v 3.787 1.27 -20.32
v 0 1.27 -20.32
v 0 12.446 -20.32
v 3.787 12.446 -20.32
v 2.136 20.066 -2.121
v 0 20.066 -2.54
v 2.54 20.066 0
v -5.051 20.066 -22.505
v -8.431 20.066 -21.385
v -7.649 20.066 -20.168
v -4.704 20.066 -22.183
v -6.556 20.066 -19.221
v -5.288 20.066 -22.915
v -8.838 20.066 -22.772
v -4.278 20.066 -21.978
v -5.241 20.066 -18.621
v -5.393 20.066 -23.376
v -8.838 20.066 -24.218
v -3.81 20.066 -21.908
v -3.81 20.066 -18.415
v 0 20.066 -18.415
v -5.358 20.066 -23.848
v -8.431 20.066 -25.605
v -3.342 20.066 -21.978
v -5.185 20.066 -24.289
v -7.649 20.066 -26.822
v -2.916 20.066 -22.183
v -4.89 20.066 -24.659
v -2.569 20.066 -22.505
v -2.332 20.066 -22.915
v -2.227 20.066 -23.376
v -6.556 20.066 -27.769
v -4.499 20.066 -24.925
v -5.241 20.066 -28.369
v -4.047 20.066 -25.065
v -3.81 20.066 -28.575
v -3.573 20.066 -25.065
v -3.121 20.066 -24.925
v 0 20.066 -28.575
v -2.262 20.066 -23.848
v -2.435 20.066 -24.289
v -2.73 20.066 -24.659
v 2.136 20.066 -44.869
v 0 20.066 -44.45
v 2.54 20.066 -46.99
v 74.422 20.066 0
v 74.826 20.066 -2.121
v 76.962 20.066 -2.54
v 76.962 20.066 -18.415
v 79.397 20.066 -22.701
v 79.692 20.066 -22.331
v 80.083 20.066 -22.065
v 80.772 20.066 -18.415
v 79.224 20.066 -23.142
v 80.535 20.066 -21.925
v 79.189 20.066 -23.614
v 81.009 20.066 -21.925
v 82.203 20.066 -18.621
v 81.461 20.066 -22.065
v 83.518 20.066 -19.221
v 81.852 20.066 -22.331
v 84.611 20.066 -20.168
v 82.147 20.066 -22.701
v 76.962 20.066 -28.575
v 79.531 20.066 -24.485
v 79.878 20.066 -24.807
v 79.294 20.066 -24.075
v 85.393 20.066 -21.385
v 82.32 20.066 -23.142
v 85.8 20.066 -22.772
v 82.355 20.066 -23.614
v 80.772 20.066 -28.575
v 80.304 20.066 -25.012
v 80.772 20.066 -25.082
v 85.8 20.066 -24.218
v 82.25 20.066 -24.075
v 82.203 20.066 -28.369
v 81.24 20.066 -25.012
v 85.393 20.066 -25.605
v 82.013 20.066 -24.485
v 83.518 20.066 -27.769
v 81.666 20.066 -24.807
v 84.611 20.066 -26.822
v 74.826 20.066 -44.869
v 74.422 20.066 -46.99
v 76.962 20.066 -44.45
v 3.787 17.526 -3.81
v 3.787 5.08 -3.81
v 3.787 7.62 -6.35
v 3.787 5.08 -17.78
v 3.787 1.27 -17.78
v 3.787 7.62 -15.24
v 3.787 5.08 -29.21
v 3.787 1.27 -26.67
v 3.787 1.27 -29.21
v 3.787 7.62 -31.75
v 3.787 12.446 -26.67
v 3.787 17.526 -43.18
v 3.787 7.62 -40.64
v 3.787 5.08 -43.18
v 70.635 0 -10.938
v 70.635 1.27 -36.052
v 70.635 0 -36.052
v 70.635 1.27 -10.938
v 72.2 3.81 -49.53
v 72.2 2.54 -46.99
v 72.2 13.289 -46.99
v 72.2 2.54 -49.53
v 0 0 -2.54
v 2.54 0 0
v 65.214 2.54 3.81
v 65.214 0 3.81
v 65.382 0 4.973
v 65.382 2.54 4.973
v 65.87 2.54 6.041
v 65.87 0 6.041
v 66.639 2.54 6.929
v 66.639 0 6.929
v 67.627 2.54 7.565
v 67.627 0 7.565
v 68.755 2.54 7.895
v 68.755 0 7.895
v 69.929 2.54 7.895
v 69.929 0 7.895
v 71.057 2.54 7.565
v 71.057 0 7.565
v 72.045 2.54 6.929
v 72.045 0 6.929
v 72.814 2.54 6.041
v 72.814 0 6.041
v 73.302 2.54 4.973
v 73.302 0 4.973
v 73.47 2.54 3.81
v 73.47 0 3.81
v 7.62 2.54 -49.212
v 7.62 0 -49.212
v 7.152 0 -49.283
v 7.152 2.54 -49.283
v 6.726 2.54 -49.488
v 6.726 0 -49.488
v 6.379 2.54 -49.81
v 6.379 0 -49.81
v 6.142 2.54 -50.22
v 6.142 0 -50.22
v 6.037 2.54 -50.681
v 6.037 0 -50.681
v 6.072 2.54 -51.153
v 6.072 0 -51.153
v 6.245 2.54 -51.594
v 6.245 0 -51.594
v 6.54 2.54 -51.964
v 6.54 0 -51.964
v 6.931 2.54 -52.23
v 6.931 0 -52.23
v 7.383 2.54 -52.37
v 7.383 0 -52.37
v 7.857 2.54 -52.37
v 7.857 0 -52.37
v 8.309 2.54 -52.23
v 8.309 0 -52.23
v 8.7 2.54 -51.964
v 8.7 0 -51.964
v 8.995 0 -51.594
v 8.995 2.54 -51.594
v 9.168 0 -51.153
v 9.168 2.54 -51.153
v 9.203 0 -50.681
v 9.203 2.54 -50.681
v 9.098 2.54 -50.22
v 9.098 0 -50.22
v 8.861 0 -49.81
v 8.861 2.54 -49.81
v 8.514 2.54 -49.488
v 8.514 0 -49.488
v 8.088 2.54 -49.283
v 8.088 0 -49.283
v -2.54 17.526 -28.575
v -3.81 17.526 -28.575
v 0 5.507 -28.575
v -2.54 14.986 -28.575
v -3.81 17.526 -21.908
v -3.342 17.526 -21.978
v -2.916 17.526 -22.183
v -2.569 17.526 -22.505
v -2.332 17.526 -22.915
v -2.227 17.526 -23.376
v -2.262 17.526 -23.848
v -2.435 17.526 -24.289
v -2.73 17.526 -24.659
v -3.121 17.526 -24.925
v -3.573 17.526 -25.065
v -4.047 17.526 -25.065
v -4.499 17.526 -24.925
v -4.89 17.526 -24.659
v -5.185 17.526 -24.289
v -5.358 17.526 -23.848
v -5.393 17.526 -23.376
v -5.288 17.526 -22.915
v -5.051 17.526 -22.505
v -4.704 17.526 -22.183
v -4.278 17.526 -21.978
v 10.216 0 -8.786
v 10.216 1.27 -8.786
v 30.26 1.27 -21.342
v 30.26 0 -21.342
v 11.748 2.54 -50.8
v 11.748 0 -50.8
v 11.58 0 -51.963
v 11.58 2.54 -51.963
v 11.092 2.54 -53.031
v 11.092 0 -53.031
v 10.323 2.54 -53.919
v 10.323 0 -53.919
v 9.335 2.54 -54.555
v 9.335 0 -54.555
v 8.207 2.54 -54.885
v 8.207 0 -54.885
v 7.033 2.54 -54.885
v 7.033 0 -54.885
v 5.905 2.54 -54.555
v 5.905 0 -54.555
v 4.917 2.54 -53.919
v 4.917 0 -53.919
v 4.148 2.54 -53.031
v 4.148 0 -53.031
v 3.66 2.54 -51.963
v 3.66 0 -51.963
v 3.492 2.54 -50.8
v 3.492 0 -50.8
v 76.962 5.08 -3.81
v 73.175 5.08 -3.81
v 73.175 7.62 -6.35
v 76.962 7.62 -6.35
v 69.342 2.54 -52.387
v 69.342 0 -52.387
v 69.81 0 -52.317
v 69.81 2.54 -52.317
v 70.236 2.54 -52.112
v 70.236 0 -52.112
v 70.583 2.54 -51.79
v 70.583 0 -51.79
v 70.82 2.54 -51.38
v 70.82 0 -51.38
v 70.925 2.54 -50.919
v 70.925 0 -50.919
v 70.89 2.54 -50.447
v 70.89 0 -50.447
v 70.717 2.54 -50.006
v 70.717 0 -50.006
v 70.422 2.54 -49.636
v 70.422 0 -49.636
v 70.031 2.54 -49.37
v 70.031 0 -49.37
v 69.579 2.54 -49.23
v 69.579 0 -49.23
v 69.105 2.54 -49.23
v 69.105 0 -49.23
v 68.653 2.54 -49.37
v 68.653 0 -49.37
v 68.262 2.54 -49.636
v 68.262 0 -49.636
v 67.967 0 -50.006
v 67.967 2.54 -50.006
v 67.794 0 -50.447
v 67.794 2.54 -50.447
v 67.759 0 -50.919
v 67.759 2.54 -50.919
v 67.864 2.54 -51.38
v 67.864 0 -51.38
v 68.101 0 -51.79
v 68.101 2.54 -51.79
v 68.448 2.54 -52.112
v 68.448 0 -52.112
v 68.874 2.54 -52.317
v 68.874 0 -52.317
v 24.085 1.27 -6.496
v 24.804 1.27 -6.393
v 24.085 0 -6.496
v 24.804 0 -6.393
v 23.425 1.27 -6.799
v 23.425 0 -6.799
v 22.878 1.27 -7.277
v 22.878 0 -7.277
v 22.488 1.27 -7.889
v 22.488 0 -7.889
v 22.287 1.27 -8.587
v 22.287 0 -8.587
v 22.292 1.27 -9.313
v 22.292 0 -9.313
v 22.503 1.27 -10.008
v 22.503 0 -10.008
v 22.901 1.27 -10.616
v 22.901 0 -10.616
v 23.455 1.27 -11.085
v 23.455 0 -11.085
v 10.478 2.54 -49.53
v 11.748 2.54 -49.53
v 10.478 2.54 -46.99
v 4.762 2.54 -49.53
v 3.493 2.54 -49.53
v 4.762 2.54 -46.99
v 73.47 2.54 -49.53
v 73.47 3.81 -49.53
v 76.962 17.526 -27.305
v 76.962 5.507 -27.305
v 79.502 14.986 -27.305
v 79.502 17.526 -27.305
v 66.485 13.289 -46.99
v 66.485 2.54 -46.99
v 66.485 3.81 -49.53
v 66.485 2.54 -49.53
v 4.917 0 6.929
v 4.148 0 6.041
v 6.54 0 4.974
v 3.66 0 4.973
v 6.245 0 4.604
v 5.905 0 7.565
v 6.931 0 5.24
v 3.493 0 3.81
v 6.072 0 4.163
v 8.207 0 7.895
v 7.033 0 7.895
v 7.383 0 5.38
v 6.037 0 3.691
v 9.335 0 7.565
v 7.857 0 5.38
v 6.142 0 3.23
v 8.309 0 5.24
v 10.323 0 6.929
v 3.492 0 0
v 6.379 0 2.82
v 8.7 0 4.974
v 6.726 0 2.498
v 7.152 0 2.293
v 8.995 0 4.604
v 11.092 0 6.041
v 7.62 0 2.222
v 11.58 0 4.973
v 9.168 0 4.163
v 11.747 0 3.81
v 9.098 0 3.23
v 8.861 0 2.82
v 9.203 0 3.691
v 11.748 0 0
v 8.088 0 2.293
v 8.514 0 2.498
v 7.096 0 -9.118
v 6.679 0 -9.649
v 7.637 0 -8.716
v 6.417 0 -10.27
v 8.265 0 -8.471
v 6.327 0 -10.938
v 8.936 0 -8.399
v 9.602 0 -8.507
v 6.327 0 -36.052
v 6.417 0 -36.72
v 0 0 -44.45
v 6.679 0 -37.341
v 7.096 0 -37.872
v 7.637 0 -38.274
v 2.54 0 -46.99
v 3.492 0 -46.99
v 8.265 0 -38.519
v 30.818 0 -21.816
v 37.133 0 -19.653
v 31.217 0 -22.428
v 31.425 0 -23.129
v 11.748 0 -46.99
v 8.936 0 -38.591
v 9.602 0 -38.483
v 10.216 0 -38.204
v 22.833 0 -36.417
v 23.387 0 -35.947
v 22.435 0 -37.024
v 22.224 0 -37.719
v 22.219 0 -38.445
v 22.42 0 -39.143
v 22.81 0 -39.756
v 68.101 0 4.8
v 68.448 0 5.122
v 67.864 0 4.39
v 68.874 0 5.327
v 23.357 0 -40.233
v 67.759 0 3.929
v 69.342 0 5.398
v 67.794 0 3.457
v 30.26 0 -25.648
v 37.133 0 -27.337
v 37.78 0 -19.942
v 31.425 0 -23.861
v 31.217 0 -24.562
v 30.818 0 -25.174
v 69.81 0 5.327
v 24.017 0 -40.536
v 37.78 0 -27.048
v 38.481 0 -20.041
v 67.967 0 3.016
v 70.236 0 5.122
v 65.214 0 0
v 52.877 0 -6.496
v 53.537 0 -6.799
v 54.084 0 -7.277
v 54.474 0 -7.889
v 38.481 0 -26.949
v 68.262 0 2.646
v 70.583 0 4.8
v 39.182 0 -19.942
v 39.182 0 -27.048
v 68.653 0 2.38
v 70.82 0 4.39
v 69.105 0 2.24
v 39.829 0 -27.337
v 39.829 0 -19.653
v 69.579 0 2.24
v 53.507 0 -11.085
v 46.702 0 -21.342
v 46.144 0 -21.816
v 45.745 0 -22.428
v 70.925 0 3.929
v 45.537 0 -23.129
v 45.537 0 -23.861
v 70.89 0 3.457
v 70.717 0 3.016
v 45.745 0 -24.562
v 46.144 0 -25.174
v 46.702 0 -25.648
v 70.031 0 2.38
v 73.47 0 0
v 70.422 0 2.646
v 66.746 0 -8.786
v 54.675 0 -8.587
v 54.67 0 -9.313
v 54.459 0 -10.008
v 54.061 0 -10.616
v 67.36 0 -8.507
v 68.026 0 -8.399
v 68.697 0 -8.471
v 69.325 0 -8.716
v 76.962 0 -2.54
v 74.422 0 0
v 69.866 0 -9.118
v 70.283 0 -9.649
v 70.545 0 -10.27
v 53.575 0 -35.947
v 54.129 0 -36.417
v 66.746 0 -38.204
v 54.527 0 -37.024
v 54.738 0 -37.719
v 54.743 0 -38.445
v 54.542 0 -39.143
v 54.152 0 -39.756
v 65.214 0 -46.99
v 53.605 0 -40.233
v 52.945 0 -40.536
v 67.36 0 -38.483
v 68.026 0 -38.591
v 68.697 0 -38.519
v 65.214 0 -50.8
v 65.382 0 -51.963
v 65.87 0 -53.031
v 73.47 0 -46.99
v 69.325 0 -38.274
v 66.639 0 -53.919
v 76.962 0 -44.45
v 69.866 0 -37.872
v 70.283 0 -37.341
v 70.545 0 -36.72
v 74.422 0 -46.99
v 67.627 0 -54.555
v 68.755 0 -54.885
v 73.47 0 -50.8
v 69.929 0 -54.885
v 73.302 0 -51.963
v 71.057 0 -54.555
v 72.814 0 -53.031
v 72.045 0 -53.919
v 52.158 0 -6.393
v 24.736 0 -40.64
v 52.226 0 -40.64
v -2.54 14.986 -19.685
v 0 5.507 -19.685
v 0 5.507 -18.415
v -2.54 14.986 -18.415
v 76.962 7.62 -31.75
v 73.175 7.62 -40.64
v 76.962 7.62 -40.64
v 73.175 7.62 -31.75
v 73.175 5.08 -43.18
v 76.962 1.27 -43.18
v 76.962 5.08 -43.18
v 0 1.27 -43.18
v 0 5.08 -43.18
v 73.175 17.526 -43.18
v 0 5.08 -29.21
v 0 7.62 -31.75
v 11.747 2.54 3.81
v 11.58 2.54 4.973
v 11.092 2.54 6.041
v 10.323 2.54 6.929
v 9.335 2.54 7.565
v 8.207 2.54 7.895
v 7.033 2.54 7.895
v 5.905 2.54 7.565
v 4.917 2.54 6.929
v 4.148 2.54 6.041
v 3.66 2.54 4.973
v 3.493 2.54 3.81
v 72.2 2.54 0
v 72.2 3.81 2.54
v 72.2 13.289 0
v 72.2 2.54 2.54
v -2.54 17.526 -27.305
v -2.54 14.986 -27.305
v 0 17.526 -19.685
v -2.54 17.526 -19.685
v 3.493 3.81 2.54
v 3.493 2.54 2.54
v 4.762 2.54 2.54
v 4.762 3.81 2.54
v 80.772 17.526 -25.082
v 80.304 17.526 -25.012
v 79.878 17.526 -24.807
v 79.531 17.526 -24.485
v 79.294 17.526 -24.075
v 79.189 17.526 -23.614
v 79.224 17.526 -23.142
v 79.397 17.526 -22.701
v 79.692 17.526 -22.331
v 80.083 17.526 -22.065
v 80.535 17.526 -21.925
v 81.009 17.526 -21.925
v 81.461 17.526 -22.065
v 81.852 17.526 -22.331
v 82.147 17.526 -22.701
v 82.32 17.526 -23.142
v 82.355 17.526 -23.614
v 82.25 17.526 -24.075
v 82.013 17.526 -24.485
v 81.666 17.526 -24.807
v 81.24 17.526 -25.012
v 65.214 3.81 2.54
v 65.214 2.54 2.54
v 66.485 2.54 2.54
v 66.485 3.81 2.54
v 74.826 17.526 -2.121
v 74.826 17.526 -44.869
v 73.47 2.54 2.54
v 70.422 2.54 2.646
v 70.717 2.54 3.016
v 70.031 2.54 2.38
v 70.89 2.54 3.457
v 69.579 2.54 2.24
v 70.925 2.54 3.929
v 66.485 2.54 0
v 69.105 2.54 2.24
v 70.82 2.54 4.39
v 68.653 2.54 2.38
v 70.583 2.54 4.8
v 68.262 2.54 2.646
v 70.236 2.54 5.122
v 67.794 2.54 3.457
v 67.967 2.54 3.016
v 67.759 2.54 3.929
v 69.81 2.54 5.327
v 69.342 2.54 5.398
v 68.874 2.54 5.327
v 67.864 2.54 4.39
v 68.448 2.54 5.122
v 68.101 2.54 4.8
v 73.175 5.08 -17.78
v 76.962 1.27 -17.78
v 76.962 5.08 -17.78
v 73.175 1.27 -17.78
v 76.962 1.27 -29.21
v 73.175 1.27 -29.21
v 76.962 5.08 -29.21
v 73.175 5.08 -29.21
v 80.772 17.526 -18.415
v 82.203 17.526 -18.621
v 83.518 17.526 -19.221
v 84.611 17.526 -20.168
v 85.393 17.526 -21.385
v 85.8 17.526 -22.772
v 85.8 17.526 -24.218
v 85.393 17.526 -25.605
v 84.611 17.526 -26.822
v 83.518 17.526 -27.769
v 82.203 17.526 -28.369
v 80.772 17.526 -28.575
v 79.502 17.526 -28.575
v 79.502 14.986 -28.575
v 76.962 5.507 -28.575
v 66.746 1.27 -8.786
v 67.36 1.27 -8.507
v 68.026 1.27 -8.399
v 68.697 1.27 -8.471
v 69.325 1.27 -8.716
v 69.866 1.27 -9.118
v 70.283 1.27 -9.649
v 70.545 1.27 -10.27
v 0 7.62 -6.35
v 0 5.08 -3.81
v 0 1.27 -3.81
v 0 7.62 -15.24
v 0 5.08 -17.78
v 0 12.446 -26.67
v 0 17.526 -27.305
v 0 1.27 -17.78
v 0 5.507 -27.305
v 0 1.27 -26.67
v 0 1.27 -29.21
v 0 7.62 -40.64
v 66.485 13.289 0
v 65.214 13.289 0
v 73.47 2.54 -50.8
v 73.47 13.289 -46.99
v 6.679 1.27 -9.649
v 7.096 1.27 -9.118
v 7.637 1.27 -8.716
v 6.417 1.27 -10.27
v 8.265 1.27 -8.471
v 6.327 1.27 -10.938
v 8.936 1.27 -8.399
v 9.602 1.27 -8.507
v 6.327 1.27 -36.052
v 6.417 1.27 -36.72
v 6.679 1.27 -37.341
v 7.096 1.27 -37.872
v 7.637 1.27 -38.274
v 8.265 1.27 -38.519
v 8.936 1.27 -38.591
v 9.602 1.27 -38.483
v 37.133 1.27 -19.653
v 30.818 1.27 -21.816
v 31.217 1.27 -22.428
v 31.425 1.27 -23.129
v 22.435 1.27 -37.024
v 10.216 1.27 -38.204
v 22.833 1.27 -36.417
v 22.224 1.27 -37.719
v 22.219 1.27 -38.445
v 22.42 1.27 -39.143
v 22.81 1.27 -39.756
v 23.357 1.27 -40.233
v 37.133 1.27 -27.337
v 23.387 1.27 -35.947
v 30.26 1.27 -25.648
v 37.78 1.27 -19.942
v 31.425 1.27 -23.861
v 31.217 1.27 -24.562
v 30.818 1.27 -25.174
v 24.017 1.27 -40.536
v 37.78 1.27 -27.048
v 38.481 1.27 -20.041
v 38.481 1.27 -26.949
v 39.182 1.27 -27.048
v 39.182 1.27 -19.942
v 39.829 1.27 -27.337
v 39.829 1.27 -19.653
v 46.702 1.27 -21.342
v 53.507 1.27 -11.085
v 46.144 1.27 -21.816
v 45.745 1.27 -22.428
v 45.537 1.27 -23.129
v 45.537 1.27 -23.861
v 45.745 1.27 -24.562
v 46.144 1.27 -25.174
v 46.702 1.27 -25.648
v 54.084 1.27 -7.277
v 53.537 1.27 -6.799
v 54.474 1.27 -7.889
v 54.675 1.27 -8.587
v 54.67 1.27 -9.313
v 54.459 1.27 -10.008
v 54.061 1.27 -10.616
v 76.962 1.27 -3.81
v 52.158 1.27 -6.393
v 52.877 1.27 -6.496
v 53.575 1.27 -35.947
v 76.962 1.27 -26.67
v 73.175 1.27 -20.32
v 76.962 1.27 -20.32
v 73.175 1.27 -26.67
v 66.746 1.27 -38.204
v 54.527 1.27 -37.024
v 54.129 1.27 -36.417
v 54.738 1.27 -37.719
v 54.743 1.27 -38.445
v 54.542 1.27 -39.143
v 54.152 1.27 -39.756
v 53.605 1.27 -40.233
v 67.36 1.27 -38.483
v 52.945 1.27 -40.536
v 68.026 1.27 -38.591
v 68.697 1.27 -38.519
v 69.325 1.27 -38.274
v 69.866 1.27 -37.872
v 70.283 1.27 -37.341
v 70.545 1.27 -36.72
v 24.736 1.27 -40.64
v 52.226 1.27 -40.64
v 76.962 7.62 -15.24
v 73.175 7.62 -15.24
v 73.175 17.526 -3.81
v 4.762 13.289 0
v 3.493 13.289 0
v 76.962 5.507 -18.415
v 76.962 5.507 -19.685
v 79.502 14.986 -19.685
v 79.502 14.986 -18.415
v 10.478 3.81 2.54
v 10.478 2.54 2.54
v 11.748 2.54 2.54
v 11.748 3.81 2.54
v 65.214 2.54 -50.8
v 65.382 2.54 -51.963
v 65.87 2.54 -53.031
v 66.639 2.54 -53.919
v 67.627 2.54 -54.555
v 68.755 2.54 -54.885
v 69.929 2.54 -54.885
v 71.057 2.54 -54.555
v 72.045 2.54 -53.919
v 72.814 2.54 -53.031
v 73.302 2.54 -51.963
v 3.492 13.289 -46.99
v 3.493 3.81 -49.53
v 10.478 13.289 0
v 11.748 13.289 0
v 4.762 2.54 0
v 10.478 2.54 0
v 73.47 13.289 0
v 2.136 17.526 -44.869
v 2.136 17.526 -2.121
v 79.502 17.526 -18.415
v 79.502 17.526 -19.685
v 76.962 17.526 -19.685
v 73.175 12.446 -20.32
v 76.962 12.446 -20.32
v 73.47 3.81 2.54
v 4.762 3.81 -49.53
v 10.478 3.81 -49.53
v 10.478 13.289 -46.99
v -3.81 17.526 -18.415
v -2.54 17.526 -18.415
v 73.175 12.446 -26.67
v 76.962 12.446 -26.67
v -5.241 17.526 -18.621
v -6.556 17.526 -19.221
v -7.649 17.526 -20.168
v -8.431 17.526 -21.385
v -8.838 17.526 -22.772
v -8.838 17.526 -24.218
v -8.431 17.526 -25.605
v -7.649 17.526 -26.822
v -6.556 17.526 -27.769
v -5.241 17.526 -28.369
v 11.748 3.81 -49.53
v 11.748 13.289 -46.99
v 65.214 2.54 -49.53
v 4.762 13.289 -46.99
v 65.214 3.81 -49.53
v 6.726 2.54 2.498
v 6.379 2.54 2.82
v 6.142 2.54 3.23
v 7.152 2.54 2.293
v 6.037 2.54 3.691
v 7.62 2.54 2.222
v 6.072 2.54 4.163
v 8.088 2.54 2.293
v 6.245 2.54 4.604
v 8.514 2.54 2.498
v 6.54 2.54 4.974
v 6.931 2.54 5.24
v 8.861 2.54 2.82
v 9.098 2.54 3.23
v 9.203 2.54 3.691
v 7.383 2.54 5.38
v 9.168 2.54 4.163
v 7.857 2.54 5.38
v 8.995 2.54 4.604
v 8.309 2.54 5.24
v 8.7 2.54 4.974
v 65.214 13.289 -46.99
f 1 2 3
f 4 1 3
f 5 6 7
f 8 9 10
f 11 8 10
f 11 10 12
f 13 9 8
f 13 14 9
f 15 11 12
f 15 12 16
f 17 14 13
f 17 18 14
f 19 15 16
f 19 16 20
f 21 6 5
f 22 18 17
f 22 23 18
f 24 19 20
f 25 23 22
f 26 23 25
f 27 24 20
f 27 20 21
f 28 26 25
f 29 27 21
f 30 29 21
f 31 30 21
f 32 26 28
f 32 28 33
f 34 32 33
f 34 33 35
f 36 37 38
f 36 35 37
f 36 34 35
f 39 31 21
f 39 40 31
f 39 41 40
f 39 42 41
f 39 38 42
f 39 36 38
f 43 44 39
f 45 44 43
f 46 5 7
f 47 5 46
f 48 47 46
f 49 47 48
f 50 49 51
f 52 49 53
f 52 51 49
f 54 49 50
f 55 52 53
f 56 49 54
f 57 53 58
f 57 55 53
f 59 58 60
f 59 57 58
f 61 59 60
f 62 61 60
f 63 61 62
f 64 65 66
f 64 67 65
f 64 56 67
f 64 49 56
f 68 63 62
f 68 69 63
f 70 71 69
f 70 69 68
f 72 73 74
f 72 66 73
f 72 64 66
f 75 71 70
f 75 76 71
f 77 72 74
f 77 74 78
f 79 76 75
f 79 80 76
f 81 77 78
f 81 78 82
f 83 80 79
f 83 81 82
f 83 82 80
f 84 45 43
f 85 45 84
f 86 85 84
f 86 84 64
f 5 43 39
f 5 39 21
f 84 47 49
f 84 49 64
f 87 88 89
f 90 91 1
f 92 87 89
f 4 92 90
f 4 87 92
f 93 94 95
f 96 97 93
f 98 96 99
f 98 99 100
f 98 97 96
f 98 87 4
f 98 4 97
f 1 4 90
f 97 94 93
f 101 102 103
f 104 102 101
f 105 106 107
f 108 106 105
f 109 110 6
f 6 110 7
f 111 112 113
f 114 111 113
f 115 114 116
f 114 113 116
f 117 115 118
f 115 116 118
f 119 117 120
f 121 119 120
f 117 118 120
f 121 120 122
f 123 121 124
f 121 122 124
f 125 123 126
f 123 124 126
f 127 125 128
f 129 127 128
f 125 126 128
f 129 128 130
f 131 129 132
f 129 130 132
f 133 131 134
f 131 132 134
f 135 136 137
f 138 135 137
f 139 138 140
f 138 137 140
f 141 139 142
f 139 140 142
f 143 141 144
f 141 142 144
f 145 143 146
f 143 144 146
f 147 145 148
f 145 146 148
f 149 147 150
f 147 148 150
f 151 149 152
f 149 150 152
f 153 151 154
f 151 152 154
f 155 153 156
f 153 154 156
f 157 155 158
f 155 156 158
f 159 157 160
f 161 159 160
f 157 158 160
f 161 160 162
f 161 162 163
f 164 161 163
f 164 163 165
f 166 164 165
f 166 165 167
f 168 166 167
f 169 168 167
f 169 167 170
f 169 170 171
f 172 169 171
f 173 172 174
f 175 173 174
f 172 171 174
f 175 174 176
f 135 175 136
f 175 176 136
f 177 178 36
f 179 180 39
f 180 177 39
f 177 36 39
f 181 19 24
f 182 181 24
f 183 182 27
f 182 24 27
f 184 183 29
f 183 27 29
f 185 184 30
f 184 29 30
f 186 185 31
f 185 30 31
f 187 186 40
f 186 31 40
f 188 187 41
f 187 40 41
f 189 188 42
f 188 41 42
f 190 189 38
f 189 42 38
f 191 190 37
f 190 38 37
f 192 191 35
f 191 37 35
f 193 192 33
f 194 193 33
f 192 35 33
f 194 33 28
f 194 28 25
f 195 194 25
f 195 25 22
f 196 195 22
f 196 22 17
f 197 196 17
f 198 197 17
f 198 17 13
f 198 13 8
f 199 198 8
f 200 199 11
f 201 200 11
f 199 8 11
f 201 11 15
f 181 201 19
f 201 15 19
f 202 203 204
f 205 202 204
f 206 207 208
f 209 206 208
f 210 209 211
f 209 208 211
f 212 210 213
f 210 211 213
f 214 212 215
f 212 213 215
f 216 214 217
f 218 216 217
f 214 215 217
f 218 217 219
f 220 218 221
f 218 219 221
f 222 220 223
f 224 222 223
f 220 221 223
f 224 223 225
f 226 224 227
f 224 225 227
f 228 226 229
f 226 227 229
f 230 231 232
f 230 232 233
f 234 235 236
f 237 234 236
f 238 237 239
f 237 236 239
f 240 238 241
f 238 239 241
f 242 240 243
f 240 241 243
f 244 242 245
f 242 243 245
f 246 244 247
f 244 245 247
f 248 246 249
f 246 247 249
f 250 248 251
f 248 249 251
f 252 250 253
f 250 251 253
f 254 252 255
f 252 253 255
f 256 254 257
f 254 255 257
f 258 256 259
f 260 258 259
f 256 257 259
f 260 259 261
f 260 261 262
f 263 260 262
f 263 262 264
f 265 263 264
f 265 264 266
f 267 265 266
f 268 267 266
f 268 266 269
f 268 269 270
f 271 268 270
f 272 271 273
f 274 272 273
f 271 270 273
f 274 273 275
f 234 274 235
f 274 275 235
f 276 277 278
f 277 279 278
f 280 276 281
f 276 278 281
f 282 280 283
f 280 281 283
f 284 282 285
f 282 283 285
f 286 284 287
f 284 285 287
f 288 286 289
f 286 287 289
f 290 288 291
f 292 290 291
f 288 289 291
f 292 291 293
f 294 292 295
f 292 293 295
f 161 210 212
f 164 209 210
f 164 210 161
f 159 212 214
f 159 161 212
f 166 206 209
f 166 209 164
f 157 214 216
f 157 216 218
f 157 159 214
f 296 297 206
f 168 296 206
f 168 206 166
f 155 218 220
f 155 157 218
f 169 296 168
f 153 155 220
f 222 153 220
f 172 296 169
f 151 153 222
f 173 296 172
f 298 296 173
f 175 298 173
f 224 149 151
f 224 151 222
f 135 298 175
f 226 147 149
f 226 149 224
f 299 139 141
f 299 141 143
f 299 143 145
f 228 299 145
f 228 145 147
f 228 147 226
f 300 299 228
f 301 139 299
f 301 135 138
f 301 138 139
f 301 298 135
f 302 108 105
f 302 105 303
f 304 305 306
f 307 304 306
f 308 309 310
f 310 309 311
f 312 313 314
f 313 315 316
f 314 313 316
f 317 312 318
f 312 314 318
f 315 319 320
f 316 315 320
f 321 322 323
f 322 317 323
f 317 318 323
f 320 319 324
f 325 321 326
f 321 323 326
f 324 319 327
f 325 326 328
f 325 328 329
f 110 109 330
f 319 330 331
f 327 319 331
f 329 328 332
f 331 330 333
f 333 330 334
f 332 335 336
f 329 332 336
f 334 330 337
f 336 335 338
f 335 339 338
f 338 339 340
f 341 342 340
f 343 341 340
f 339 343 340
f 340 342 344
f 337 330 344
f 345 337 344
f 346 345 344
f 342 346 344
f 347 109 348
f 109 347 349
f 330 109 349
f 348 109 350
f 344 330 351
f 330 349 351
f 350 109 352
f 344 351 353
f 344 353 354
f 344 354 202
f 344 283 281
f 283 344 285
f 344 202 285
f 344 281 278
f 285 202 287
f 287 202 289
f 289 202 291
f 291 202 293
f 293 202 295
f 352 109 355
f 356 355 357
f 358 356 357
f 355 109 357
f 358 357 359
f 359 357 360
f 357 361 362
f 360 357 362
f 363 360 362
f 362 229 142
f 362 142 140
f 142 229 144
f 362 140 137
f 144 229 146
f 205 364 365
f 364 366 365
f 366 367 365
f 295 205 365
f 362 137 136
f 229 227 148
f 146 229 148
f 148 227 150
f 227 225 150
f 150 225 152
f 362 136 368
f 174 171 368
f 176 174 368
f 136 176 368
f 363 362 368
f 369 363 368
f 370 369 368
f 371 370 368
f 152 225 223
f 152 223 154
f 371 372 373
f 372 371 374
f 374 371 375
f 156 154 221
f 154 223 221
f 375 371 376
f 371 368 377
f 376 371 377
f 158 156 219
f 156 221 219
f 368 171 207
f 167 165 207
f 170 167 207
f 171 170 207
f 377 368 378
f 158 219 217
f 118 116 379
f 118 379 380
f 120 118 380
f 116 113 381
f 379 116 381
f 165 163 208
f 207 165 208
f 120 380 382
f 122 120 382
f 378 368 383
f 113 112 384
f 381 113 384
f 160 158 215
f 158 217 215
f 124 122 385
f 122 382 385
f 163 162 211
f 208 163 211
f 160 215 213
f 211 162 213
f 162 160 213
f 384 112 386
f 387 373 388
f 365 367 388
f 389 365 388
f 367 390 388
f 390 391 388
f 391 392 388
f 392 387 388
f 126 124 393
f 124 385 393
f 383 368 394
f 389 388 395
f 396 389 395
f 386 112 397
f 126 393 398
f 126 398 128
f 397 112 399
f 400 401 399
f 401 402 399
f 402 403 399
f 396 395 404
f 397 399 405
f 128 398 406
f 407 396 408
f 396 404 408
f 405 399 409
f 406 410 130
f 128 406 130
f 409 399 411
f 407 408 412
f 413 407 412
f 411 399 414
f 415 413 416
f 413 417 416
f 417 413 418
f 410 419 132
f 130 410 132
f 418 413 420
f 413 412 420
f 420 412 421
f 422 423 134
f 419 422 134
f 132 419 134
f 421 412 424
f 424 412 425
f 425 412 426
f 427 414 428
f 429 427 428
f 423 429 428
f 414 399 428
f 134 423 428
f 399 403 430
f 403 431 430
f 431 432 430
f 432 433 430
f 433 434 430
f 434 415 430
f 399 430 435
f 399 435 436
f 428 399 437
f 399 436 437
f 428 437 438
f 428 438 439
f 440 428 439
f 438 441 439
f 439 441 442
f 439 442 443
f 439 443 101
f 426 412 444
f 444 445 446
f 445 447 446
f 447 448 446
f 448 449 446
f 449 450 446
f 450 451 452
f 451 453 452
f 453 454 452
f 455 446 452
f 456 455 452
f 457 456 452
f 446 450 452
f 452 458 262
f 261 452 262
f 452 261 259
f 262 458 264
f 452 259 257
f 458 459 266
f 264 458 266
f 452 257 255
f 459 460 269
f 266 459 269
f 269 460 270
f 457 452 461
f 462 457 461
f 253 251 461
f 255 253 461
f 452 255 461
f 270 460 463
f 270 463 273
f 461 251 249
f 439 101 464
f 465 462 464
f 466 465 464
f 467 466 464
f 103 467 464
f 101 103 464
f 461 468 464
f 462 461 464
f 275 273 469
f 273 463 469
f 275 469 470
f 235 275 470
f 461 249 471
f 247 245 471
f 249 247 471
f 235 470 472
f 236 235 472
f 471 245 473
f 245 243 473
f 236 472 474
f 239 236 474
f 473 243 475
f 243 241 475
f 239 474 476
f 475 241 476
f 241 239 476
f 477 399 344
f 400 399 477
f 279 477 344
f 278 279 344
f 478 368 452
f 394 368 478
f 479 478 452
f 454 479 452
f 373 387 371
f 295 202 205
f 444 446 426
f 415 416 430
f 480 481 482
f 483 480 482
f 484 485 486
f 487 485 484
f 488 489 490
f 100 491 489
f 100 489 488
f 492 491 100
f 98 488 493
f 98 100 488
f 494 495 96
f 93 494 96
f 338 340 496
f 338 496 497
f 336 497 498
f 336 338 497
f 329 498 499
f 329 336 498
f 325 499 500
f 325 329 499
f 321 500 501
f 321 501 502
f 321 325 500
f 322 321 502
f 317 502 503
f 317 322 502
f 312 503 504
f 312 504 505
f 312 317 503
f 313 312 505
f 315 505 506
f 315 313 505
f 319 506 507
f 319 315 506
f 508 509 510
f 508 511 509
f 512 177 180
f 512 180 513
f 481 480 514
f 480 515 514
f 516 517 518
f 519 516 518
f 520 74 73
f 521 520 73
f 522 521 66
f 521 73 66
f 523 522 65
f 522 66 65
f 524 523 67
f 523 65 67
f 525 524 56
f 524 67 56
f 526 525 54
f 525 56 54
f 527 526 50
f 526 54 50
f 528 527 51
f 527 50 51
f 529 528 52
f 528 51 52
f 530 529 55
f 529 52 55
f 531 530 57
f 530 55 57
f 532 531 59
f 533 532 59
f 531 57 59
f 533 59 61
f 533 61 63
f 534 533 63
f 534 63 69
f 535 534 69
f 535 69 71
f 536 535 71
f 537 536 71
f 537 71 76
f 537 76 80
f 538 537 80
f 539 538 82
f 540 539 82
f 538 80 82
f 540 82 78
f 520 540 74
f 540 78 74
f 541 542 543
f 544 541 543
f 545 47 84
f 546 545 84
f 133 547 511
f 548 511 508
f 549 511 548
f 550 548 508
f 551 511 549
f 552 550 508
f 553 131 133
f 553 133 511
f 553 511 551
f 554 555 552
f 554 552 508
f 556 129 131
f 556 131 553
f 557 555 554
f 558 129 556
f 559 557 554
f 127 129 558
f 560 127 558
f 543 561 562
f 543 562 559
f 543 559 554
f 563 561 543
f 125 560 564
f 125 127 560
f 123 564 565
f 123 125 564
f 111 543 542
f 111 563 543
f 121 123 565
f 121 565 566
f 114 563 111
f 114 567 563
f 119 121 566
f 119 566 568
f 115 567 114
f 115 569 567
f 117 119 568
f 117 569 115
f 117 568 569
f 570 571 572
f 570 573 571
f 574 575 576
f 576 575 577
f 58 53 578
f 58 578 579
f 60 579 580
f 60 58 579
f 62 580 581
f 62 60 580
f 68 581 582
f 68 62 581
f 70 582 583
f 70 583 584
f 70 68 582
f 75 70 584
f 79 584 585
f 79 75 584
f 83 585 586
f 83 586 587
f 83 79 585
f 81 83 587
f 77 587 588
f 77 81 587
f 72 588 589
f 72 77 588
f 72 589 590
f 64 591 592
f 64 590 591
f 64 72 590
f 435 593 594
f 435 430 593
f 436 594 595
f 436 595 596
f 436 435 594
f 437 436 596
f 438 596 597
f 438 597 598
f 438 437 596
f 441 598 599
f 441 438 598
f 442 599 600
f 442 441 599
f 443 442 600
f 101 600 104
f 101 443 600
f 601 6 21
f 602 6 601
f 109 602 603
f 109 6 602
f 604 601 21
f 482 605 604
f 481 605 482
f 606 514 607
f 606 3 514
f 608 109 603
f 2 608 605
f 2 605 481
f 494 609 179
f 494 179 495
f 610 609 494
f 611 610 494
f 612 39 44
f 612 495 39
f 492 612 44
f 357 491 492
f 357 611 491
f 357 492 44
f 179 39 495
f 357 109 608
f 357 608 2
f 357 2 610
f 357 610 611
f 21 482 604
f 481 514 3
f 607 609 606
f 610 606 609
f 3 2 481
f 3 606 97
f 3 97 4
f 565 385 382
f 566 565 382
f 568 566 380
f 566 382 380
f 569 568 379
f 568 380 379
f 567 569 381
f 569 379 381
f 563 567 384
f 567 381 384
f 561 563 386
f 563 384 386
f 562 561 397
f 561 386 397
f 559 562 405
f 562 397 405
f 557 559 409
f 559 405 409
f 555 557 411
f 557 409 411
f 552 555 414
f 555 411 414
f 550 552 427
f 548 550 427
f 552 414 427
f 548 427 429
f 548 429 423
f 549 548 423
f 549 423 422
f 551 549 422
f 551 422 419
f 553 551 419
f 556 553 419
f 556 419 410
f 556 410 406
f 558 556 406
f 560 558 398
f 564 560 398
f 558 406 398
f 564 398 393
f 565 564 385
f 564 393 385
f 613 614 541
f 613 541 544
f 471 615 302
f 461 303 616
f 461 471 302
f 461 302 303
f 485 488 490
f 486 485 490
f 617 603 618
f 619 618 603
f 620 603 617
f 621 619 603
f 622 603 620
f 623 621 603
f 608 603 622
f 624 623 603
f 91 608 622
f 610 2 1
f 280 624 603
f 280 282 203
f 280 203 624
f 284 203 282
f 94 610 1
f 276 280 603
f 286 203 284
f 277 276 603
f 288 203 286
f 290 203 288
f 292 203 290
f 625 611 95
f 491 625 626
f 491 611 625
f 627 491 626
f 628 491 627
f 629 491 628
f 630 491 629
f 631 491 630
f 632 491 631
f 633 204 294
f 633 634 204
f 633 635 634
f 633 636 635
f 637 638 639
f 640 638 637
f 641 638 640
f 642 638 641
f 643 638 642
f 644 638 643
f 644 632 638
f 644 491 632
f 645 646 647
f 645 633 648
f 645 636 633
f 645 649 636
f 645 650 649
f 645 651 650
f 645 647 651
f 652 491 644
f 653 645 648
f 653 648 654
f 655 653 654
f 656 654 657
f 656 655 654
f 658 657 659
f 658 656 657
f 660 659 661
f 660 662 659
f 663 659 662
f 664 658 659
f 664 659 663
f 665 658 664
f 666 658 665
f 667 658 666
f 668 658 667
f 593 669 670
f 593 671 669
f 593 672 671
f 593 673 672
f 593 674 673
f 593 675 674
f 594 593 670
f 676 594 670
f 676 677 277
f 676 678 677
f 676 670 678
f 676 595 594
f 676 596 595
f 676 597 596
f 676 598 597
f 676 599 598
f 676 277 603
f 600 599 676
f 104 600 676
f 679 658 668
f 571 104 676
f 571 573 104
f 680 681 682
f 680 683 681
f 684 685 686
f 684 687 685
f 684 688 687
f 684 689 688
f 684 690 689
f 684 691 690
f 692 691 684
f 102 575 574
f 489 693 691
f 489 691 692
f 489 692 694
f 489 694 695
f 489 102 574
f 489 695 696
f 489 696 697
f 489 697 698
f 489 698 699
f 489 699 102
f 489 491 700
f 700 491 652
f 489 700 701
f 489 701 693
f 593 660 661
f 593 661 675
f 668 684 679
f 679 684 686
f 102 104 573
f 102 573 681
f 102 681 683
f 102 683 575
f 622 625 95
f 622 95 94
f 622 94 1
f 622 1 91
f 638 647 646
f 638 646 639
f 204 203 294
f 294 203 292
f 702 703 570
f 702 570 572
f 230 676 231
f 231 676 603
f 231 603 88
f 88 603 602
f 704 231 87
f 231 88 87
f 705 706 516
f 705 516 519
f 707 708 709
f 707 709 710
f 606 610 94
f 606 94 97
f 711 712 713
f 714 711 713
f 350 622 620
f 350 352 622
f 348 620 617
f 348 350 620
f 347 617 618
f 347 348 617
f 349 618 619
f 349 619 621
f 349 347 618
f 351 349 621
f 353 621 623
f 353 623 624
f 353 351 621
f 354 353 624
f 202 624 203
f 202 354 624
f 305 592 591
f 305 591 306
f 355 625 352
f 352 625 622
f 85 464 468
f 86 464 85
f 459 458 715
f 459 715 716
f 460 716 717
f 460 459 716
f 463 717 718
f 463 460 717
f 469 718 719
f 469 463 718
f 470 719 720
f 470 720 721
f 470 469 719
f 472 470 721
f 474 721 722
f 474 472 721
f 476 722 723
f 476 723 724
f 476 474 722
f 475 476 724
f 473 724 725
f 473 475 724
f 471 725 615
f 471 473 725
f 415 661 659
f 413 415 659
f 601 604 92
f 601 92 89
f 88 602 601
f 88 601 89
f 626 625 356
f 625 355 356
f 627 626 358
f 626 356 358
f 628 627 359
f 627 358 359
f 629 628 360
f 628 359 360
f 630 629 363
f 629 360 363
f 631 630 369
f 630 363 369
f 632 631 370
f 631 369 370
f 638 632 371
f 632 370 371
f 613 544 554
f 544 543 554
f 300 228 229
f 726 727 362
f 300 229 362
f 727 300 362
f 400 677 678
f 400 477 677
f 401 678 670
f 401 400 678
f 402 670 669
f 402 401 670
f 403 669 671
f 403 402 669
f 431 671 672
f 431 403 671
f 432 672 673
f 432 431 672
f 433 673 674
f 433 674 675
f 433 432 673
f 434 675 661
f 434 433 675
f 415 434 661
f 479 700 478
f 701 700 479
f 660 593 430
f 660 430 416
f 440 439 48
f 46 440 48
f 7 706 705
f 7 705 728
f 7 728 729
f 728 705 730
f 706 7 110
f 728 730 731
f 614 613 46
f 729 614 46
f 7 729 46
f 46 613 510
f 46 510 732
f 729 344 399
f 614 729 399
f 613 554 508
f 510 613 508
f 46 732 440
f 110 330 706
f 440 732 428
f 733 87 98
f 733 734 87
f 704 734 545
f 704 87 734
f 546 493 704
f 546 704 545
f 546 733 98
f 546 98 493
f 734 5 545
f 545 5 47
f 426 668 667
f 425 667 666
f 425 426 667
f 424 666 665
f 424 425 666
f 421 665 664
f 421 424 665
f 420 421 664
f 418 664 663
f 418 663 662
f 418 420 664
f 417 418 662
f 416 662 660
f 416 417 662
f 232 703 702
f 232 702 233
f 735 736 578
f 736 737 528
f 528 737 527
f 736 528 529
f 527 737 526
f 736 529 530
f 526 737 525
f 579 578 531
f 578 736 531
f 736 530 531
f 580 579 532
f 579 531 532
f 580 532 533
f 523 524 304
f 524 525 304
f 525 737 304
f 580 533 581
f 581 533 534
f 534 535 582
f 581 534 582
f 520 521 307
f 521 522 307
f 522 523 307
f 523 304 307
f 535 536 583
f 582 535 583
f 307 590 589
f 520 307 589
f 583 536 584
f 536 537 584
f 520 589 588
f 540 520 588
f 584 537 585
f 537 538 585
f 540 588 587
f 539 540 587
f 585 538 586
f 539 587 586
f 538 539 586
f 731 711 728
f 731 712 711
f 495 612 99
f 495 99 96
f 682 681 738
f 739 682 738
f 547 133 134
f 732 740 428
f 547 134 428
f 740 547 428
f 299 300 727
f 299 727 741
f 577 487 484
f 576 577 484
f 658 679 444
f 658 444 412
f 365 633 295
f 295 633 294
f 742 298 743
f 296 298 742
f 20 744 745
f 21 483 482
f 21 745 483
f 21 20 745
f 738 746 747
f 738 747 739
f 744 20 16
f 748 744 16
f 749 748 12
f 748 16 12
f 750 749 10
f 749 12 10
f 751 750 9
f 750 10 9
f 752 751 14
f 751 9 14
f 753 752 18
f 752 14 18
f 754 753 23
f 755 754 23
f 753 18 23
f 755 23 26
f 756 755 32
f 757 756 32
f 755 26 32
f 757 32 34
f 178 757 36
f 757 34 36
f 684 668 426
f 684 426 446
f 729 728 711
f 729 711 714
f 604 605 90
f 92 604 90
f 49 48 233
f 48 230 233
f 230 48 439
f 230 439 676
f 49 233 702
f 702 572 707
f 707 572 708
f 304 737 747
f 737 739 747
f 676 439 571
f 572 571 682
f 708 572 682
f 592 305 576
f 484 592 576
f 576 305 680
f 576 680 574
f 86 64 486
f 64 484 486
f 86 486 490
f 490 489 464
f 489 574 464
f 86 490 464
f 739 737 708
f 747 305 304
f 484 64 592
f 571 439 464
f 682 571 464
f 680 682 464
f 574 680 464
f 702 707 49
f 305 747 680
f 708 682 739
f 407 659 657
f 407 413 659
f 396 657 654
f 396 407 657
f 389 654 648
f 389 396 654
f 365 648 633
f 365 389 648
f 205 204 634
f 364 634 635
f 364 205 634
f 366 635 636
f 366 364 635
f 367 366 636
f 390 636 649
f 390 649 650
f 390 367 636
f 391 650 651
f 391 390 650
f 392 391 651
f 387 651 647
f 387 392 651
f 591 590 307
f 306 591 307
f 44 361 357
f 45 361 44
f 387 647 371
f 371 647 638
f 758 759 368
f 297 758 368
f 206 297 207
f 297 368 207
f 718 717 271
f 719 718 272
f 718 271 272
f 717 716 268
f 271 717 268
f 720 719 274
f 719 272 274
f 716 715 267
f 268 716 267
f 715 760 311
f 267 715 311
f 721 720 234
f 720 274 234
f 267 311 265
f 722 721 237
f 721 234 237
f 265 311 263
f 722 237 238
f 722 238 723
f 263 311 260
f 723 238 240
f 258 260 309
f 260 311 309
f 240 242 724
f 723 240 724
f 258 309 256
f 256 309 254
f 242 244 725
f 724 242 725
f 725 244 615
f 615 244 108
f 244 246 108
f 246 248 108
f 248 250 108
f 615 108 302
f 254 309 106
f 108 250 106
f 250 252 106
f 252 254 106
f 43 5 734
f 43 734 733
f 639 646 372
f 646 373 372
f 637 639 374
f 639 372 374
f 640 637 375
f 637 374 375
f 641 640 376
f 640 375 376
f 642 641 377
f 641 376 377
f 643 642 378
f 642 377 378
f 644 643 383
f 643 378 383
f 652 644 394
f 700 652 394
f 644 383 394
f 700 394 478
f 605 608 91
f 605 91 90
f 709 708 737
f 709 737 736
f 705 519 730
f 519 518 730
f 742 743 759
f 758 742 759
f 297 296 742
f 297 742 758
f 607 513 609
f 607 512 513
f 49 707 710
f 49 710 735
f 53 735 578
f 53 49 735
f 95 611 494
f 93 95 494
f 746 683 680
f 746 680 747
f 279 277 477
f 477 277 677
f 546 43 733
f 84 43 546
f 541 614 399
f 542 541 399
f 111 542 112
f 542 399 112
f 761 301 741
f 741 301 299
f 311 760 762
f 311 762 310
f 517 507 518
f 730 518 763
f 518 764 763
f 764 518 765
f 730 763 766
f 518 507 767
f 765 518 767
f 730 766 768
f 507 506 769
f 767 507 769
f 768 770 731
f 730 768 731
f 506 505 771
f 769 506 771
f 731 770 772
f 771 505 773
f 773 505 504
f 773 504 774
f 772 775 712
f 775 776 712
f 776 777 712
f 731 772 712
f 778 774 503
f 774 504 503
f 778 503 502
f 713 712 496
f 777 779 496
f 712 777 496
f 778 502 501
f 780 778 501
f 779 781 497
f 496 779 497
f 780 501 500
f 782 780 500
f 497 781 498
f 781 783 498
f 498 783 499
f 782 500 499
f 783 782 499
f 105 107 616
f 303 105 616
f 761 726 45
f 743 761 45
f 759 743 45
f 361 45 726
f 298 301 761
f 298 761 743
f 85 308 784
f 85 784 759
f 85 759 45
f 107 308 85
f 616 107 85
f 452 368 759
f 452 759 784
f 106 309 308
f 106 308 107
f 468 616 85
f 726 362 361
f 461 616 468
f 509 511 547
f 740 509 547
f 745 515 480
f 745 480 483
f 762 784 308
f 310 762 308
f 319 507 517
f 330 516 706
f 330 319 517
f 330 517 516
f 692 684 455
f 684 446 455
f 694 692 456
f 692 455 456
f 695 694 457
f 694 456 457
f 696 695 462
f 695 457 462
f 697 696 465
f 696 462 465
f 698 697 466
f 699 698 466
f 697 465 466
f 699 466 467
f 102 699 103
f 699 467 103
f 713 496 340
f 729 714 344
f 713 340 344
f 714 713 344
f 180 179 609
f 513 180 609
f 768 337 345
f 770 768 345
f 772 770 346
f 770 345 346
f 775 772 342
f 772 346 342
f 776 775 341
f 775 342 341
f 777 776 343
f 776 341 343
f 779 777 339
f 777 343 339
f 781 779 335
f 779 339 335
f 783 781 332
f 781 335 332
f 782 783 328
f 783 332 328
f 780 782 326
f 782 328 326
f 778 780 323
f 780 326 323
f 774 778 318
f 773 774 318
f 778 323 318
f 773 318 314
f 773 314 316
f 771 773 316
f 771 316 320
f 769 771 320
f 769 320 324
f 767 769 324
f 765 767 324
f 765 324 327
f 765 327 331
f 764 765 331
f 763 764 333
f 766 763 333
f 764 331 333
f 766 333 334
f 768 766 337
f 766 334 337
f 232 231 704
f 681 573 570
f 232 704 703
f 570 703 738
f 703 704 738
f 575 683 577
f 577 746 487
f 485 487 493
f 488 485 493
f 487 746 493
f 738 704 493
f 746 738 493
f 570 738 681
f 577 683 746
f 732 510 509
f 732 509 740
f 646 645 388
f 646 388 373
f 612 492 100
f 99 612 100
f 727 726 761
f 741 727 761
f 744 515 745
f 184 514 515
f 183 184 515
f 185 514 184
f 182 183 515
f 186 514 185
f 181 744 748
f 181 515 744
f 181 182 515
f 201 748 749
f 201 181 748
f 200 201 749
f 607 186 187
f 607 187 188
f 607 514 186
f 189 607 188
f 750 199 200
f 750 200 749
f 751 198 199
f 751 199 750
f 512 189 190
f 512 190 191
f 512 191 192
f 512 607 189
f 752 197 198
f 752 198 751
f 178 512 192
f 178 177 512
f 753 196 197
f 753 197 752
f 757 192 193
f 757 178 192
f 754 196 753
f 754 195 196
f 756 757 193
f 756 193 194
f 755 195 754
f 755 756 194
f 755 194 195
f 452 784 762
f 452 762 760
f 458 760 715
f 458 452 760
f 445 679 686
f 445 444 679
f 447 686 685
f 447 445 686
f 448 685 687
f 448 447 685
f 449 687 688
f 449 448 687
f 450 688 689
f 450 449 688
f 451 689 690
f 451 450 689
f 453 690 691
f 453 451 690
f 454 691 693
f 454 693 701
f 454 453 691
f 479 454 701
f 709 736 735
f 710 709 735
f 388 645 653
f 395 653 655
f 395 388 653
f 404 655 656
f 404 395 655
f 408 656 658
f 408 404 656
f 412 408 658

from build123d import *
from OCP.BRepFilletAPI import BRepFilletAPI_MakeChamfer

# Parameters (mm, degrees)
SKETCH1_W           = 76.962
SKETCH1_H           = 46.99
BOSS_EXTRUDE1_DEPTH = 20.066
SKETCH2_W           = 72.68972
SKETCH2_H           = 42.7482
CUT_EXTRUDE1_DEPTH  = 2.54
SKETCH3_W           = 69.38772
SKETCH3_H           = 39.37
CUT_EXTRUDE2_DEPTH  = 16.256
CHAMFER1_SIZE       = 2.54
SKETCH6_R           = 1.5875
BOSS_EXTRUDE2_DEPTH = 2.54
CUT_EXTRUDE5_DEPTH  = 97.402641646
FILLET1_R           = 2.54
SKETCH9_R           = 1.5875
BOSS_EXTRUDE3_DEPTH = 2.54
SKETCH12_W          = 1.27
SKETCH12_H          = 2.54
BOSS_EXTRUDE5_DEPTH = 1.27
CHAMFER4_SIZE       = 2.54
CHAMFER4_SIZE_2     = 9.479409052
SKETCH13_W          = 6.35
SKETCH13_H          = 11.176
SKETCH13_W_2        = 13.97
SKETCH13_H_2        = 6.35
CUT_EXTRUDE7_DEPTH  = 104.876082503
SKETCH14_W          = 2.54
SKETCH14_H          = 1.27
BOSS_EXTRUDE6_DEPTH = 2.54
CHAMFER5_SIZE       = 2.54000495
CHAMFER5_SIZE_2     = 9.479427523
CHAMFER6_SIZE       = 2.54


with BuildPart() as part:
    # Sketch1 → Boss-Extrude1 (new body)
    with BuildSketch(Plane(origin=(0, 0, 0), x_dir=(1, 0, 0), z_dir=(0, 1, 0))):
        with Locations((38.481, 23.495)):
            Rectangle(SKETCH1_W, SKETCH1_H)
    extrude(amount=BOSS_EXTRUDE1_DEPTH)

    # Sketch2 → Cut-Extrude1 (cut)
    with BuildSketch(Plane(origin=(0, 20.066, 0), x_dir=(1, 0, 0), z_dir=(0, 1, 0))):
        with Locations((38.481, 23.495)):
            Rectangle(SKETCH2_W, SKETCH2_H)
    extrude(amount=-CUT_EXTRUDE1_DEPTH, mode=Mode.SUBTRACT)

    # Sketch3 → Cut-Extrude2 (cut)
    with BuildSketch(Plane(origin=(0, 17.526, 0), x_dir=(1, 0, 0), z_dir=(0, 1, 0))):
        with Locations((38.481, 23.495)):
            Rectangle(SKETCH3_W, SKETCH3_H)
    extrude(amount=-CUT_EXTRUDE2_DEPTH, mode=Mode.SUBTRACT)

    # Chamfer1
    chamfer1_edges = [part.edges().sort_by_distance(p)[0] for p in [
        (0, 10.033, -46.99),
        (76.962, 10.033, -46.99),
        (76.962, 10.033, 0),
        (0, 10.033, 0),
    ]]
    chamfer(chamfer1_edges, length=CHAMFER1_SIZE)

    # Sketch6 → Boss-Extrude2 (add)
    # profile 1 of 4: a face of its own
    with BuildSketch(Plane.XZ):
        with BuildLine():
            Line((3.4925, 3.81), (3.4925, 0))
            Line((3.4925, 0), (11.7475, 0))
            Line((11.7475, 0), (11.7475, 3.81))
            ThreePointArc((11.7475, 3.81), (7.62, 7.9375), (3.4925, 3.81))
        make_face()
        with Locations(Location((7.62, 3.81, 0), (0, 0, 270))):
            Circle(SKETCH6_R, mode=Mode.SUBTRACT)
    # profile 2 of 4: a face of its own
    with BuildSketch(Plane.XZ):
        with BuildLine():
            Line((11.7475, -46.99), (11.7475, -50.8))
            ThreePointArc((11.7475, -50.8), (7.62, -54.9275), (3.4925, -50.8))
            Line((3.4925, -50.8), (3.4925, -46.99))
            Line((3.4925, -46.99), (11.7475, -46.99))
        make_face()
        with Locations(Location((7.62, -50.8, 0), (0, 0, 90))):
            Circle(SKETCH6_R, mode=Mode.SUBTRACT)
    # profile 3 of 4: a face of its own
    with BuildSketch(Plane.XZ):
        with BuildLine():
            Line((73.4695, -50.8), (73.4695, -46.99))
            Line((73.4695, -46.99), (65.2145, -46.99))
            Line((65.2145, -46.99), (65.2145, -50.8))
            ThreePointArc((65.2145, -50.8), (69.342, -54.9275), (73.4695, -50.8))
        make_face()
        with Locations(Location((69.342, -50.8, 0), (0, 0, 270))):
            Circle(SKETCH6_R, mode=Mode.SUBTRACT)
    # profile 4 of 4: a face of its own
    with BuildSketch(Plane.XZ):
        with BuildLine():
            Line((65.2145, 0), (65.2145, 3.81))
            ThreePointArc((65.2145, 3.81), (69.342, 7.9375), (73.4695, 3.81))
            Line((73.4695, 3.81), (73.4695, 0))
            Line((73.4695, 0), (65.2145, 0))
        make_face()
        with Locations(Location((69.342, 3.81, 0), (0, 0, 90))):
            Circle(SKETCH6_R, mode=Mode.SUBTRACT)
    extrude(amount=-BOSS_EXTRUDE2_DEPTH)

    # Sketch7 → Cut-Extrude5 (cut, through all)
    with BuildSketch(Plane(origin=(0, 1.27, 0), x_dir=(1, 0, 0), z_dir=(0, 1, 0))):
        Polygon((15.896309728, 40.64), (61.065690272, 40.64), (38.481, 26.492218855), align=None)
        Polygon((6.32714, 40.64), (6.32714, 6.35), (33.696415136, 23.495), align=None)
        Polygon((15.964259965, 6.392566228), (60.997740035, 6.392566228), (38.481, 20.497781145), align=None)
        Polygon((70.63486, 40.64), (70.63486, 6.35), (43.265584864, 23.495), align=None)
    extrude(amount=-CUT_EXTRUDE5_DEPTH, mode=Mode.SUBTRACT)

    # Fillet1
    fillet1_edges = [part.edges().sort_by_distance(p)[0] for p in [
        (61.065690272, 0.635, -40.64),
        (38.481, 0.635, -26.492218855),
        (15.896309728, 0.635, -40.64),
        (15.964259965, 0.635, -6.392566228),
        (38.481, 0.635, -20.497781145),
        (60.997740035, 0.635, -6.392566228),
        (43.265584864, 0.635, -23.495),
        (70.63486, 0.635, -40.64),
        (70.63486, 0.635, -6.35),
        (33.696415136, 0.635, -23.495),
        (6.32714, 0.635, -6.35),
        (6.32714, 0.635, -40.64),
    ]]
    fillet(fillet1_edges, radius=FILLET1_R)

    # Sketch9 → Boss-Extrude3 (add)
    # profile 1 of 2: a face of its own
    with BuildSketch(Plane(origin=(0, 20.066, 0), x_dir=(1, 0, 0), z_dir=(0, 1, 0))):
        with BuildLine():
            Line((-3.81, 28.575), (0, 28.575))
            Line((0, 28.575), (0, 18.415))
            Line((0, 18.415), (-3.81, 18.415))
            ThreePointArc((-3.81, 18.415), (-8.89, 23.495), (-3.81, 28.575))
        make_face()
        with Locations(Location((-3.81, 23.495, 0), (0, 0, 270))):
            Circle(SKETCH9_R, mode=Mode.SUBTRACT)
    # profile 2 of 2: a face of its own
    with BuildSketch(Plane(origin=(0, 20.066, 0), x_dir=(1, 0, 0), z_dir=(0, 1, 0))):
        with BuildLine():
            Line((76.962, 18.415), (80.772, 18.415))
            ThreePointArc((80.772, 18.415), (85.852, 23.495), (80.772, 28.575))
            Line((80.772, 28.575), (76.962, 28.575))
            Line((76.962, 28.575), (76.962, 18.415))
        make_face()
        with Locations(Location((80.772, 23.495, 0), (0, 0, 90))):
            Circle(SKETCH9_R, mode=Mode.SUBTRACT)
    extrude(amount=-BOSS_EXTRUDE3_DEPTH)

    # Sketch12 → Boss-Extrude5 (add)
    with BuildSketch(Plane(origin=(0, 2.54, 0), x_dir=(1, 0, 0), z_dir=(0, 1, 0))):
        with Locations((4.1275, -1.27)):
            Rectangle(SKETCH12_W, SKETCH12_H)
        with Locations((11.1125, -1.27)):
            Rectangle(SKETCH12_W, SKETCH12_H)
        with Locations((11.1125, 48.26)):
            Rectangle(SKETCH12_W, SKETCH12_H)
        with Locations((4.1275, 48.26)):
            Rectangle(SKETCH12_W, SKETCH12_H)
        with Locations((72.8345, 48.26)):
            Rectangle(SKETCH12_W, SKETCH12_H)
        with Locations((65.8495, 48.26)):
            Rectangle(SKETCH12_W, SKETCH12_H)
        with Locations((65.8495, -1.27)):
            Rectangle(SKETCH12_W, SKETCH12_H)
        with Locations((72.8345, -1.27)):
            Rectangle(SKETCH12_W, SKETCH12_H)
    extrude(amount=BOSS_EXTRUDE5_DEPTH)

    # Chamfer4
    chamfer4_edges_1 = [part.edges().sort_by_distance(p)[0] for p in [
        (4.1275, 3.81, -46.99),
    ]]
    chamfer4_side_1 = [part.faces().sort_by_distance(p)[0] for p in [
        (4.1275, 3.81, -47.0408),
    ]]
    chamfer4_edges_2 = [part.edges().sort_by_distance(p)[0] for p in [
        (11.1125, 3.81, -46.99),
    ]]
    chamfer4_side_2 = [part.faces().sort_by_distance(p)[0] for p in [
        (11.1125, 3.81, -47.0408),
    ]]
    chamfer4_edges_3 = [part.edges().sort_by_distance(p)[0] for p in [
        (65.8495, 3.81, -46.99),
    ]]
    chamfer4_side_3 = [part.faces().sort_by_distance(p)[0] for p in [
        (65.8495, 3.81, -47.0408),
    ]]
    chamfer4_edges_4 = [part.edges().sort_by_distance(p)[0] for p in [
        (72.8345, 3.81, -46.99),
    ]]
    chamfer4_side_4 = [part.faces().sort_by_distance(p)[0] for p in [
        (72.8345, 3.81, -47.0408),
    ]]
    chamfer4_edges_5 = [part.edges().sort_by_distance(p)[0] for p in [
        (65.8495, 3.81, 0),
    ]]
    chamfer4_side_5 = [part.faces().sort_by_distance(p)[0] for p in [
        (65.8495, 3.81, 0.0508),
    ]]
    chamfer4_edges_6 = [part.edges().sort_by_distance(p)[0] for p in [
        (72.8345, 3.81, 0),
    ]]
    chamfer4_side_6 = [part.faces().sort_by_distance(p)[0] for p in [
        (72.8345, 3.81, 0.0508),
    ]]
    chamfer4_edges_7 = [part.edges().sort_by_distance(p)[0] for p in [
        (11.1125, 3.81, 0),
    ]]
    chamfer4_side_7 = [part.faces().sort_by_distance(p)[0] for p in [
        (11.1125, 3.81, 0.0508),
    ]]
    chamfer4_edges_8 = [part.edges().sort_by_distance(p)[0] for p in [
        (4.1275, 3.81, 0),
    ]]
    chamfer4_side_8 = [part.faces().sort_by_distance(p)[0] for p in [
        (4.1275, 3.81, 0.0508),
    ]]
    chamfer4 = BRepFilletAPI_MakeChamfer(part.part.solid().wrapped)
    for e in chamfer4_edges_1:
        chamfer4.Add(CHAMFER4_SIZE - 0.0001, CHAMFER4_SIZE_2 - 0.0001, e.wrapped, chamfer4_side_1[0].wrapped)
    for e in chamfer4_edges_2:
        chamfer4.Add(CHAMFER4_SIZE - 0.0001, CHAMFER4_SIZE_2 - 0.0001, e.wrapped, chamfer4_side_2[0].wrapped)
    for e in chamfer4_edges_3:
        chamfer4.Add(CHAMFER4_SIZE - 0.0001, CHAMFER4_SIZE_2 - 0.0001, e.wrapped, chamfer4_side_3[0].wrapped)
    for e in chamfer4_edges_4:
        chamfer4.Add(CHAMFER4_SIZE - 0.0001, CHAMFER4_SIZE_2 - 0.0001, e.wrapped, chamfer4_side_4[0].wrapped)
    for e in chamfer4_edges_5:
        chamfer4.Add(CHAMFER4_SIZE - 0.0001, CHAMFER4_SIZE_2 - 0.0001, e.wrapped, chamfer4_side_5[0].wrapped)
    for e in chamfer4_edges_6:
        chamfer4.Add(CHAMFER4_SIZE - 0.0001, CHAMFER4_SIZE_2 - 0.0001, e.wrapped, chamfer4_side_6[0].wrapped)
    for e in chamfer4_edges_7:
        chamfer4.Add(CHAMFER4_SIZE - 0.0001, CHAMFER4_SIZE_2 - 0.0001, e.wrapped, chamfer4_side_7[0].wrapped)
    for e in chamfer4_edges_8:
        chamfer4.Add(CHAMFER4_SIZE - 0.0001, CHAMFER4_SIZE_2 - 0.0001, e.wrapped, chamfer4_side_8[0].wrapped)
    add(Compound.cast(chamfer4.Shape()), mode=Mode.REPLACE)  # a hair under: the kernel refuses the full size

    # Sketch13 → Cut-Extrude7 (cut, through all)
    with BuildSketch(Plane.ZY):
        with Locations((-23.495, 6.858)):
            Rectangle(SKETCH13_W, SKETCH13_H)
        with Locations((-36.195, 4.445)):
            Rectangle(SKETCH13_W_2, SKETCH13_H_2)
        with Locations((-10.795, 4.445)):
            Rectangle(SKETCH13_W_2, SKETCH13_H_2)
    extrude(amount=-CUT_EXTRUDE7_DEPTH, mode=Mode.SUBTRACT)

    # Sketch14 → Boss-Extrude6 (add)
    with BuildSketch(Plane.XZ.offset(-17.526)):
        with Locations((-1.27, -19.05)):
            Rectangle(SKETCH14_W, SKETCH14_H)
        with Locations((-1.27, -27.94)):
            Rectangle(SKETCH14_W, SKETCH14_H)
        with Locations((78.232, -27.94)):
            Rectangle(SKETCH14_W, SKETCH14_H)
        with Locations((78.232, -19.05)):
            Rectangle(SKETCH14_W, SKETCH14_H)
    extrude(amount=BOSS_EXTRUDE6_DEPTH)

    # Chamfer5
    chamfer5_edges_1 = [part.edges().sort_by_distance(p)[0] for p in [
        (76.962, 14.986, -19.05),
    ]]
    chamfer5_side_1 = [part.faces().sort_by_distance(p)[0] for p in [
        (77.012800099, 14.986, -19.05),
    ]]
    chamfer5_edges_2 = [part.edges().sort_by_distance(p)[0] for p in [
        (76.962, 14.986, -27.94),
    ]]
    chamfer5_side_2 = [part.faces().sort_by_distance(p)[0] for p in [
        (77.012800099, 14.986, -27.94),
    ]]
    chamfer5_edges_3 = [part.edges().sort_by_distance(p)[0] for p in [
        (0, 14.986, -27.94),
    ]]
    chamfer5_side_3 = [part.faces().sort_by_distance(p)[0] for p in [
        (-0.050800099, 14.986, -27.94),
    ]]
    chamfer5_edges_4 = [part.edges().sort_by_distance(p)[0] for p in [
        (0, 14.986, -19.05),
    ]]
    chamfer5_side_4 = [part.faces().sort_by_distance(p)[0] for p in [
        (-0.050800099, 14.986, -19.05),
    ]]
    chamfer5 = BRepFilletAPI_MakeChamfer(part.part.solid().wrapped)
    for e in chamfer5_edges_1:
        chamfer5.Add(CHAMFER5_SIZE - 0.0001, CHAMFER5_SIZE_2 - 0.0001, e.wrapped, chamfer5_side_1[0].wrapped)
    for e in chamfer5_edges_2:
        chamfer5.Add(CHAMFER5_SIZE - 0.0001, CHAMFER5_SIZE_2 - 0.0001, e.wrapped, chamfer5_side_2[0].wrapped)
    for e in chamfer5_edges_3:
        chamfer5.Add(CHAMFER5_SIZE - 0.0001, CHAMFER5_SIZE_2 - 0.0001, e.wrapped, chamfer5_side_3[0].wrapped)
    for e in chamfer5_edges_4:
        chamfer5.Add(CHAMFER5_SIZE - 0.0001, CHAMFER5_SIZE_2 - 0.0001, e.wrapped, chamfer5_side_4[0].wrapped)
    add(Compound.cast(chamfer5.Shape()), mode=Mode.REPLACE)  # a hair under: the kernel refuses the full size

    # Chamfer6
    chamfer6_edges = [part.edges().sort_by_distance(p)[0] for p in [
        (75.06843, 7.62, -43.18),
        (1.89357, 7.62, -43.18),
        (75.06843, 7.62, -29.21),
        (1.89357, 7.62, -29.21),
        (75.06843, 7.62, -17.78),
        (1.89357, 7.62, -17.78),
        (75.06843, 7.62, -3.81),
        (1.89357, 7.62, -3.81),
    ]]
    chamfer(chamfer6_edges, length=CHAMFER6_SIZE)


solid = part.part
